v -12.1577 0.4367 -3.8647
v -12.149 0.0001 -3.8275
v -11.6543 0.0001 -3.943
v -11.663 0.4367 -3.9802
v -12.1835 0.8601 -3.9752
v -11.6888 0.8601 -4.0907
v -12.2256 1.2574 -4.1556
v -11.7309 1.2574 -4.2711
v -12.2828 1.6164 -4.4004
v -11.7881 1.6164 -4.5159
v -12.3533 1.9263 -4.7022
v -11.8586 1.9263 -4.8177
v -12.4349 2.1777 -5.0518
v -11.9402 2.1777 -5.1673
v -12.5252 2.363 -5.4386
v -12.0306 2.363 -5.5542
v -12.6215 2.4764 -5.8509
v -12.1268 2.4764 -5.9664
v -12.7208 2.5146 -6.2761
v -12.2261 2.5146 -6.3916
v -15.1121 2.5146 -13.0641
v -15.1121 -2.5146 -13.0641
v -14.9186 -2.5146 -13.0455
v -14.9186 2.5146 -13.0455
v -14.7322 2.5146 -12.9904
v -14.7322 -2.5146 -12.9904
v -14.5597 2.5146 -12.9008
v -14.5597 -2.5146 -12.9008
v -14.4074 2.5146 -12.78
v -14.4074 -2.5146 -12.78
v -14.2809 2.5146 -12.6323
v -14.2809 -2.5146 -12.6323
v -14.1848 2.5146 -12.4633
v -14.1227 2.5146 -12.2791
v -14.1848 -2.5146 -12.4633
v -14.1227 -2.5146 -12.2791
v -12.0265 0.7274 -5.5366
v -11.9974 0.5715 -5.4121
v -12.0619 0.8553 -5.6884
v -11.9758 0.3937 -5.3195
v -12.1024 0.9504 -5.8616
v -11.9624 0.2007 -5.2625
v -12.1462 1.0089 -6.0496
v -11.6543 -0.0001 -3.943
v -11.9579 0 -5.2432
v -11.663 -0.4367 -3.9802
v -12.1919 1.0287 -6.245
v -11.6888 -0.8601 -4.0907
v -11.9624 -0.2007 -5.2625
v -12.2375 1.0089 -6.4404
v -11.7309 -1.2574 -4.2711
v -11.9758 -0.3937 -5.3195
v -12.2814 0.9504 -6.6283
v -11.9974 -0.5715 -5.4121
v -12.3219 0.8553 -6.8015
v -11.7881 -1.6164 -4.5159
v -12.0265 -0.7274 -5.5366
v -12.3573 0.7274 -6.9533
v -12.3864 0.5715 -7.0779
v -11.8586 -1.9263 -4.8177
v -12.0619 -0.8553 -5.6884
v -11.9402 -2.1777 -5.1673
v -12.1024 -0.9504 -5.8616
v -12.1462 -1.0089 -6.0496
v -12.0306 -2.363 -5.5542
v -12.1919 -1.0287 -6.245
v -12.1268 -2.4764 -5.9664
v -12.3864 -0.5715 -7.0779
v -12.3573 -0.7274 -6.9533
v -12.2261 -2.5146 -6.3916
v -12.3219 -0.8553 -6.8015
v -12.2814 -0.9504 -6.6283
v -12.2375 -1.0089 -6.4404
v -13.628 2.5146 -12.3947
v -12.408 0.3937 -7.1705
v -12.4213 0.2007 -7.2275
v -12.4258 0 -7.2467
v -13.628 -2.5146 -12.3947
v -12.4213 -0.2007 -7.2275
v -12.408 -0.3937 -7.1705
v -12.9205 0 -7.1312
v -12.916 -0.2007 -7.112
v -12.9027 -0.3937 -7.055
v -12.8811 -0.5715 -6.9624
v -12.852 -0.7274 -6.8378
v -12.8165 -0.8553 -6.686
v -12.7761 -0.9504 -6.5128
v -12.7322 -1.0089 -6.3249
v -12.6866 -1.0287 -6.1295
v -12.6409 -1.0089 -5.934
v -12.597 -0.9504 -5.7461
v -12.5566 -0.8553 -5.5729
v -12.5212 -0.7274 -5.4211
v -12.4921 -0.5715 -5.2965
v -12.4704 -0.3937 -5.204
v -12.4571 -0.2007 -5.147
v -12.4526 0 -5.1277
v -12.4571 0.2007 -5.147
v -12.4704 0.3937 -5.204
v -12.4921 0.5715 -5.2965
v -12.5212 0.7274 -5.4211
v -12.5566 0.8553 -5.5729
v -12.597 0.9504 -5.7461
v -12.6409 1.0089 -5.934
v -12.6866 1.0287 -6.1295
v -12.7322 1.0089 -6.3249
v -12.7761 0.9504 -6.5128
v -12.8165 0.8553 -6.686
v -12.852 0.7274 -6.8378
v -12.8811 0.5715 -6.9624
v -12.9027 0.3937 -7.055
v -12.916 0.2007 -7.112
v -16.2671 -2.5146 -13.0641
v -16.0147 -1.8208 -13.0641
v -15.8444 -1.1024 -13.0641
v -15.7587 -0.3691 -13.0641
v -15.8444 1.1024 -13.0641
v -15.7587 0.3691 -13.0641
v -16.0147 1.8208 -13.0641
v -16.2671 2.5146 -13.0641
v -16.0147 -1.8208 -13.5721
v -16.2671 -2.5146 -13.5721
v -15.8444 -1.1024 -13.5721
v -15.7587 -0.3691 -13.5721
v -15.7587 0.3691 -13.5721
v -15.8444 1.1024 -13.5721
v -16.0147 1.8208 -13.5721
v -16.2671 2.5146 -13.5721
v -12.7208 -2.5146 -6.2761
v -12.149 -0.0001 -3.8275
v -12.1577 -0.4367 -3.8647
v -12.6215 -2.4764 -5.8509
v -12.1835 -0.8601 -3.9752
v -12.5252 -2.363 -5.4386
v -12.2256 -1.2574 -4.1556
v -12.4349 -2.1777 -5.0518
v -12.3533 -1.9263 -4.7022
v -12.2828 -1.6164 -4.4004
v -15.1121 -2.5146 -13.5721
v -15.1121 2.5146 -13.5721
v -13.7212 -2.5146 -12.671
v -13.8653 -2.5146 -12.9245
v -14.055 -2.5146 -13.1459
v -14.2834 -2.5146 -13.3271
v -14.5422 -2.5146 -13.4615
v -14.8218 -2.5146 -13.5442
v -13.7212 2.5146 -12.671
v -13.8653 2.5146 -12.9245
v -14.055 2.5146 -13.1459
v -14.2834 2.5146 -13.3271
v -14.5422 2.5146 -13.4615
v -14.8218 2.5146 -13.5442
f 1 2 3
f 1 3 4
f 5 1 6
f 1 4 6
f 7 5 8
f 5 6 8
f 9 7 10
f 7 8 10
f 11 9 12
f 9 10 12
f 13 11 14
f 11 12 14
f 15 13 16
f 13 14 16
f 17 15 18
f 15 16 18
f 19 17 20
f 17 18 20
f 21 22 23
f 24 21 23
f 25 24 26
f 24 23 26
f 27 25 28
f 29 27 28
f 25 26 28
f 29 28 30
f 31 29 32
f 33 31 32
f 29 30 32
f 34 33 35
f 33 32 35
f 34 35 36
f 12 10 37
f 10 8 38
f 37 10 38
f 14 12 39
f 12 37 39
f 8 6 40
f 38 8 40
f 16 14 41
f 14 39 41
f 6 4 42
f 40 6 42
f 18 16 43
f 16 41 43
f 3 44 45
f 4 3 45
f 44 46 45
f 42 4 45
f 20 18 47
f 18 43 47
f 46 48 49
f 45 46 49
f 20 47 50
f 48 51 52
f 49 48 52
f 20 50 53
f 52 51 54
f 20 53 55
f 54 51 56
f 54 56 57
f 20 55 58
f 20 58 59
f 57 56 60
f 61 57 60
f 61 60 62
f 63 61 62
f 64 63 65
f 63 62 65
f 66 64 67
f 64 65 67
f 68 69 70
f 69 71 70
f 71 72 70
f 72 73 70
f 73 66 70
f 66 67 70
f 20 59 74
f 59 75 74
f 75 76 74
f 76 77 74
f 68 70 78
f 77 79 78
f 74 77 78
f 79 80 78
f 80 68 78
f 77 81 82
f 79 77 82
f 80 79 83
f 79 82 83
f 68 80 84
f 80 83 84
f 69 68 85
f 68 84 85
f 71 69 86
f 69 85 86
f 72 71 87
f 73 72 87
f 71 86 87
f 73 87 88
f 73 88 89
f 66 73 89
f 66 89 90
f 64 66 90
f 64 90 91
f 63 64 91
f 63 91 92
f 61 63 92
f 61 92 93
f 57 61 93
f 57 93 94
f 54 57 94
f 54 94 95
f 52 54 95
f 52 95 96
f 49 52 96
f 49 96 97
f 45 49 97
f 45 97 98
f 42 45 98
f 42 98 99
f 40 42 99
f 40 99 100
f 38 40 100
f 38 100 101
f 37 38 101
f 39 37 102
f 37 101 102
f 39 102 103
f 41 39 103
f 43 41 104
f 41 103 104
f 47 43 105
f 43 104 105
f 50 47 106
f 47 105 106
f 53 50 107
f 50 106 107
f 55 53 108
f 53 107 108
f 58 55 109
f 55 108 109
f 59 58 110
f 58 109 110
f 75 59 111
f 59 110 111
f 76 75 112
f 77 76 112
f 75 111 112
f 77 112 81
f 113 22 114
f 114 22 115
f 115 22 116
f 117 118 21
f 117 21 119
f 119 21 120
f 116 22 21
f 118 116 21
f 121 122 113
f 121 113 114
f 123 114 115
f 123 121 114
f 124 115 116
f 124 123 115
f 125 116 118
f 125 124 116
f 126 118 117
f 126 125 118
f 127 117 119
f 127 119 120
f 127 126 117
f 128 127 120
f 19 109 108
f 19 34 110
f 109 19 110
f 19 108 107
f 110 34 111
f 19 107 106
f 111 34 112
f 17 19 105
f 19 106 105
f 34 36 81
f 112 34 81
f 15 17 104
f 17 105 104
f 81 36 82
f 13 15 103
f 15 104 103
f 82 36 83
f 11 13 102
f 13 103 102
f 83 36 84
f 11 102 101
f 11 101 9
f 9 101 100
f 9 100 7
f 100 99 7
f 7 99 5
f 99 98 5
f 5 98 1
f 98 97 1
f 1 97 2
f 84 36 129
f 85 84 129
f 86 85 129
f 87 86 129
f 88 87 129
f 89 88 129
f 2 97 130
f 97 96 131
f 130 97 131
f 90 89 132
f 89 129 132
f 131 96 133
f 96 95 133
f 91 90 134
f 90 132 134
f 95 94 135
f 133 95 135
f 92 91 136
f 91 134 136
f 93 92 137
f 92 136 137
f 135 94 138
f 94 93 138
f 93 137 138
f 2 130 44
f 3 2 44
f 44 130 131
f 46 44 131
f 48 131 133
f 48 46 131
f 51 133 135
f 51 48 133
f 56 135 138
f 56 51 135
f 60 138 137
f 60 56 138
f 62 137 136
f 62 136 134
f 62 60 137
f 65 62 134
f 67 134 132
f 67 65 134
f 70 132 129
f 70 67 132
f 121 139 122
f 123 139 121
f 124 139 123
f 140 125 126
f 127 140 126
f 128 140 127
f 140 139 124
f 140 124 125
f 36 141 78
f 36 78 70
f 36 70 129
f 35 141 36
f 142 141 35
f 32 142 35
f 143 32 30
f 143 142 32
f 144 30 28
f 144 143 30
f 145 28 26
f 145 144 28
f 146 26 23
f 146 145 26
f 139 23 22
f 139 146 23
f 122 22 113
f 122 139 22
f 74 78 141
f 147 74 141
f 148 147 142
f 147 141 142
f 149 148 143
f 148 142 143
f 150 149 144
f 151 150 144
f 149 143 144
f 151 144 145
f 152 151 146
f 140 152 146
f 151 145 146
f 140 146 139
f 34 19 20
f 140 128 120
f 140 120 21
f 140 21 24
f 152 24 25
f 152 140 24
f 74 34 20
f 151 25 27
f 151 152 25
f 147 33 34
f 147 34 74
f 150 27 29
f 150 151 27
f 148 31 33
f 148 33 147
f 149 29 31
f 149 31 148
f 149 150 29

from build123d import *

# Parameters (mm, degrees)
EXTRUDE1_DEPTH                   = 2.5146
EXTRUDE1_DEPTH_BACK              = 2.5146
FILLET1_R                        = 2.5146
EXTRUDE2_DEPTH                   = 0.508
F_97_0_0059_DIAMETER_HOLE1_D     = 2.0574
F_97_0_0059_DIAMETER_HOLE1_DEPTH = 6.35


with BuildPart() as part:
    # Sketch1 → Extrude1 (new, two sides: drawn at the far end of the back side and taken through both)
    with BuildSketch(Plane(origin=(0, 0, 0), x_dir=(1, 0, 0), z_dir=(0, 1, 0)).offset(-EXTRUDE1_DEPTH_BACK)):
        with BuildLine():
            Line((-15.145893147, 13.572089242), (-15.145893147, 13.064089242))
            Line((-15.145893147, 13.064089242), (-15.112093192, 13.064089242))
            ThreePointArc((-15.112093192, 13.064089242), (-14.480623322, 12.844017507), (-14.122713826, 12.279140036))
            Line((-14.122713826, 12.279140036), (-12.14899346, 3.827499715))
            Line((-12.14899346, 3.827499715), (-11.654303777, 3.943025112))
            Line((-11.654303777, 3.943025112), (-13.628024142, 12.394665433))
            ThreePointArc((-13.628024142, 12.394665433), (-14.164888387, 13.24198164), (-15.112093192, 13.572089242))
            Line((-15.112093192, 13.572089242), (-15.145893147, 13.572089242))
        make_face()
    extrude(amount=EXTRUDE1_DEPTH + EXTRUDE1_DEPTH_BACK)

    # Fillet1
    fillet1_edges = [part.edges().sort_by_distance(p)[0] for p in [
        (-11.901648619, -2.5146, -3.885262414),
        (-11.901648619, 2.5146, -3.885262414),
    ]]
    fillet(fillet1_edges, radius=FILLET1_R - 0.0001)  # a hair under: the kernel refuses the full size

    # Sketch2 → Extrude2 (add)
    with BuildSketch(Plane(origin=(0, 0, -13.572089242), x_dir=(-1, 0, 0), z_dir=(0, 0, -1))):
        with BuildLine():
            Line((15.145893147, 2.5146), (15.145893147, -2.5146))
            Line((15.145893147, -2.5146), (16.267109258, -2.5146))
            ThreePointArc((16.267109258, -2.5146), (15.748, 0), (16.267109258, 2.5146))
            Line((16.267109258, 2.5146), (15.145893147, 2.5146))
        make_face()
    extrude(amount=-EXTRUDE2_DEPTH)

    # #97 (0.0059) Diameter Hole1
    with Locations(Plane(origin=(-12.191883936, 0, -6.244989577), x_dir=(0.227412198577, 0, 0.973798589), z_dir=(0.973798589, 0, -0.227412198577))):
        with Locations((0, 0)):
            Hole(F_97_0_0059_DIAMETER_HOLE1_D / 2, depth=F_97_0_0059_DIAMETER_HOLE1_DEPTH)


solid = part.part
